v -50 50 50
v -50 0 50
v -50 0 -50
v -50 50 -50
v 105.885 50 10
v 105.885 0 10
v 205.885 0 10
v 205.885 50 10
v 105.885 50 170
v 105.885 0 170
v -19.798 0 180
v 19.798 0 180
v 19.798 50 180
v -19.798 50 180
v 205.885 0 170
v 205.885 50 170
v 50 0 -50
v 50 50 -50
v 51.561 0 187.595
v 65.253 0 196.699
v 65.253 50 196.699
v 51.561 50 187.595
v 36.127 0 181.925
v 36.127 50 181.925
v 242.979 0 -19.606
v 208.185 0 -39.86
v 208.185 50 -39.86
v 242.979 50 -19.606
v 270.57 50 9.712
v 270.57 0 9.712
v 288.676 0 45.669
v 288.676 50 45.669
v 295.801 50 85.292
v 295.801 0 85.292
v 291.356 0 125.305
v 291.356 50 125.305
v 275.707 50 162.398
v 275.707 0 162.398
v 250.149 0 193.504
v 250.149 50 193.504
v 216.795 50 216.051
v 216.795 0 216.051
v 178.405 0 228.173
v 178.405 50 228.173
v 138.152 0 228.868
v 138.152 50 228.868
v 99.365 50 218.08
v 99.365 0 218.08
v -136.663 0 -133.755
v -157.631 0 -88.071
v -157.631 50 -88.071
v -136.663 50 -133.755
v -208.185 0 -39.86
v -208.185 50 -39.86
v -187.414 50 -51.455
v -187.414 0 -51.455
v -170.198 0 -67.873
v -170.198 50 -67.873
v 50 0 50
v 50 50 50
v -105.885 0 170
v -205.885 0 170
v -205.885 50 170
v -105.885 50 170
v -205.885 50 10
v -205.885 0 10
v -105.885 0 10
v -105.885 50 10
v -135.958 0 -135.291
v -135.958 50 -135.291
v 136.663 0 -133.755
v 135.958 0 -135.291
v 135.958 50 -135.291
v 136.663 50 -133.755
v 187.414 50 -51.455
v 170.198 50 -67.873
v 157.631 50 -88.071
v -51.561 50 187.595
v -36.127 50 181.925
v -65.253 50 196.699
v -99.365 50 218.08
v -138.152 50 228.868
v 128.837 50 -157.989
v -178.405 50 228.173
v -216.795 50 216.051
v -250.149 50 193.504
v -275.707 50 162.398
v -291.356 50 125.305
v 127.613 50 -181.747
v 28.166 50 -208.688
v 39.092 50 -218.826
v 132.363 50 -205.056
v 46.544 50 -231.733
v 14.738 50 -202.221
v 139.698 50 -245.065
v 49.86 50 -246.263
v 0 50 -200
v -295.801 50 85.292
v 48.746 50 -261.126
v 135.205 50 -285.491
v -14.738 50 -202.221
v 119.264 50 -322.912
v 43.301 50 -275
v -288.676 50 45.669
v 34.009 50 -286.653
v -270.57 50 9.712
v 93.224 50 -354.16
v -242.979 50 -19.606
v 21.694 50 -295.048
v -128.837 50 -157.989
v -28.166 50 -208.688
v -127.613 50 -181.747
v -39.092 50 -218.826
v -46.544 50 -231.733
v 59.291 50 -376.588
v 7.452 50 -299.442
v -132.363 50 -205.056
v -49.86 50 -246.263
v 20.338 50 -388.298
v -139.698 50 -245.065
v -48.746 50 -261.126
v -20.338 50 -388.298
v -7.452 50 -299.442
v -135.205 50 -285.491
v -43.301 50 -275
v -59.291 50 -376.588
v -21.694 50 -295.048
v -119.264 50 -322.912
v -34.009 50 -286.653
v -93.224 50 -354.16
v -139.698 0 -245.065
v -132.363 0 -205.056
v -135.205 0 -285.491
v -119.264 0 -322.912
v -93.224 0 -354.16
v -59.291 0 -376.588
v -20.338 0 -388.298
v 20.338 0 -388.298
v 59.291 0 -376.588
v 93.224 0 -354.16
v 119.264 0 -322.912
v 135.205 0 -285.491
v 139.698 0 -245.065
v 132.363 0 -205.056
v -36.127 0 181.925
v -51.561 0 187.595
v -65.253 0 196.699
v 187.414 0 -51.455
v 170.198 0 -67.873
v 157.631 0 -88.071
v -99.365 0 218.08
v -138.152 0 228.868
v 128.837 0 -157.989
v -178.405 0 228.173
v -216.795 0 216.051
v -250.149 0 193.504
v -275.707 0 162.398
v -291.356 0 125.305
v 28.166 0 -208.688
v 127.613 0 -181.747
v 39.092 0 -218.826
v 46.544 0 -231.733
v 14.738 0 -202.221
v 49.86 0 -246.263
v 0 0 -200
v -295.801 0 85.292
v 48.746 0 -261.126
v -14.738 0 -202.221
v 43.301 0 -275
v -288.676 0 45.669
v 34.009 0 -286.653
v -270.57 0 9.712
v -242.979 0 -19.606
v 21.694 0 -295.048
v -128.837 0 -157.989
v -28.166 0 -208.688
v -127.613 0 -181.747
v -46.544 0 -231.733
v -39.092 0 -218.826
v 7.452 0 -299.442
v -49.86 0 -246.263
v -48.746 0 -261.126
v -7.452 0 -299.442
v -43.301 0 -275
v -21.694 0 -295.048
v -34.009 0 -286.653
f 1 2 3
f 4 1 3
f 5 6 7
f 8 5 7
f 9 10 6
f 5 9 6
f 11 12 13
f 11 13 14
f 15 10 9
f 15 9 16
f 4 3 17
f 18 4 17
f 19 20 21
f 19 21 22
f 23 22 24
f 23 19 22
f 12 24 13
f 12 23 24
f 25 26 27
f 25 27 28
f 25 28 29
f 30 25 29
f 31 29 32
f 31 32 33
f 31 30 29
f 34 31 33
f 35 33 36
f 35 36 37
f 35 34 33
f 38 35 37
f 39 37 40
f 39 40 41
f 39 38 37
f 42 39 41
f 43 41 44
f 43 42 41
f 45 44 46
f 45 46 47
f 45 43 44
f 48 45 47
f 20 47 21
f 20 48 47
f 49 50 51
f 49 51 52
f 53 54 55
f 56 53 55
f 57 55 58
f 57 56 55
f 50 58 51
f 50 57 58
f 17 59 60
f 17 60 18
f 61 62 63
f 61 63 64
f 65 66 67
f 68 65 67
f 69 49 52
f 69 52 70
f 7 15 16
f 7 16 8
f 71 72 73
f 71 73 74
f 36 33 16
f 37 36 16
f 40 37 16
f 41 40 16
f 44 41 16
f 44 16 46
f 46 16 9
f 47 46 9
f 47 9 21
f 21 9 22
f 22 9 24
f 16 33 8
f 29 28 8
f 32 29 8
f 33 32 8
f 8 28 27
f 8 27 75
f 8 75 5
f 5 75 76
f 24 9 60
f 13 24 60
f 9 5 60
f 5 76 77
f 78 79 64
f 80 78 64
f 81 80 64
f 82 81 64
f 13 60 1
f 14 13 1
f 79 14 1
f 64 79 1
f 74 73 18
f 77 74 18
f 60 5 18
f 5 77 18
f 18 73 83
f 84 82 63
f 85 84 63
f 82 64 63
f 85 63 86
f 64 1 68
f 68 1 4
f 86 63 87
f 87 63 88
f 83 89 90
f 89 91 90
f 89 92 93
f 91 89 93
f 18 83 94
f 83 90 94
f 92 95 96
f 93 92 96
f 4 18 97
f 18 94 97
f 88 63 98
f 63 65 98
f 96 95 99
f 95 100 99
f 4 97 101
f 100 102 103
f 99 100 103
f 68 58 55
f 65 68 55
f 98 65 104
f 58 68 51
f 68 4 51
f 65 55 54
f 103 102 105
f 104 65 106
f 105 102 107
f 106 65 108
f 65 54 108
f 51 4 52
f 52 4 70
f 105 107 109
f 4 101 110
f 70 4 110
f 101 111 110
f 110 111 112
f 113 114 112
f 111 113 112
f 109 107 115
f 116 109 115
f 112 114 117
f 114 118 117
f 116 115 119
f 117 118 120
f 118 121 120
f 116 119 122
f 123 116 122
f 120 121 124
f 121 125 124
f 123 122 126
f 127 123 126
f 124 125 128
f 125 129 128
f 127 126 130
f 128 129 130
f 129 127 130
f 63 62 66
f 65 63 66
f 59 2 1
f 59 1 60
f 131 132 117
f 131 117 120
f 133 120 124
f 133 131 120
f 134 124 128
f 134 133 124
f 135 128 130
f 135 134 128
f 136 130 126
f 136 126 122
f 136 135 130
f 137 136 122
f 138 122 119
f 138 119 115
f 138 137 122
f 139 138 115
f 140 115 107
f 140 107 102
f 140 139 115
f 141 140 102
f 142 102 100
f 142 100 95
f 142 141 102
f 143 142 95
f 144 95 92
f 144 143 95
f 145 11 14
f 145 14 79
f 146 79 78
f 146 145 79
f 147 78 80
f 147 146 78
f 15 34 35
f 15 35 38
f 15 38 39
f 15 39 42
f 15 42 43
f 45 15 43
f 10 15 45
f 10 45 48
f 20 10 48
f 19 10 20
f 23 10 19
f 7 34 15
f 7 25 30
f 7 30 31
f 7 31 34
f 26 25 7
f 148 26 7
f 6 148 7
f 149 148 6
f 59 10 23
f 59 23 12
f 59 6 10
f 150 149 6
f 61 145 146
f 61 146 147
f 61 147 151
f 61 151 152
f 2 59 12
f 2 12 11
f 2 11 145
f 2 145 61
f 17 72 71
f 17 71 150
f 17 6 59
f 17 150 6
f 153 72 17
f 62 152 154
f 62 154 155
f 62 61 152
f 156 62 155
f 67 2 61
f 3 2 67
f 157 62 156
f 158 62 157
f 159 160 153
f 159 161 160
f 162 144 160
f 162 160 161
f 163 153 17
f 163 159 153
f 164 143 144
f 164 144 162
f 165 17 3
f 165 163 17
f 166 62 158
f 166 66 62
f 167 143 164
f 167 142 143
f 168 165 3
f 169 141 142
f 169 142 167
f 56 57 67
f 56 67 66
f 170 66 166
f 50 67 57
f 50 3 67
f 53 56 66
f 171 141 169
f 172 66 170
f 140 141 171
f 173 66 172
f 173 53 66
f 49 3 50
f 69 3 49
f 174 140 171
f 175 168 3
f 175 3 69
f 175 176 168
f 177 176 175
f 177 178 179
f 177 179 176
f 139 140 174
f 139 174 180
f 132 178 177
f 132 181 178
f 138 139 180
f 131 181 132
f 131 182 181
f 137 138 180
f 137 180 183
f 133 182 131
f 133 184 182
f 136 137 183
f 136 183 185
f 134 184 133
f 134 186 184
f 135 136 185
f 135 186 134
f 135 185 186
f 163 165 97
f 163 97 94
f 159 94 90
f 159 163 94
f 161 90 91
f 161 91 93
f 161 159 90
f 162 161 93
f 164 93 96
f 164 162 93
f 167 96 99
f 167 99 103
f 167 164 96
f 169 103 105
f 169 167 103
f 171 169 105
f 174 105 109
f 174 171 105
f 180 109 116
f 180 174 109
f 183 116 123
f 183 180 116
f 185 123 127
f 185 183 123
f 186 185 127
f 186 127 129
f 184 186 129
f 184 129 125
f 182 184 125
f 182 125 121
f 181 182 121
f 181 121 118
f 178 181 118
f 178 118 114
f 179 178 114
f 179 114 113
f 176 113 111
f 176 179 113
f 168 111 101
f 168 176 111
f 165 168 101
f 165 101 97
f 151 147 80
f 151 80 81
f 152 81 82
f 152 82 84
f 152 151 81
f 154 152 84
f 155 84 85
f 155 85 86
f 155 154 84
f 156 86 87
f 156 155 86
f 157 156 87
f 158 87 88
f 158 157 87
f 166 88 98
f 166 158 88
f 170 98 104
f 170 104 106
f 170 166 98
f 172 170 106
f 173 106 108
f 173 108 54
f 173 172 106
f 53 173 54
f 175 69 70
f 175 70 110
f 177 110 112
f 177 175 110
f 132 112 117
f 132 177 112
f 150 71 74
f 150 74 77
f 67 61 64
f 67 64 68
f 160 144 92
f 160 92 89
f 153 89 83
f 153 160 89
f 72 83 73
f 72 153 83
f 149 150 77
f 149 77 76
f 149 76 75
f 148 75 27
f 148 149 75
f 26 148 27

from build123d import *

# Parameters (mm, degrees)
SKETCH1_R           = 50
SKETCH1_W           = 100
SKETCH1_H           = 100
SKETCH1_H_2         = 160
BOSS_EXTRUDE1_DEPTH = 50


with BuildPart() as part:
    # Sketch1 → Boss-Extrude1 (new body)
    with BuildSketch(Plane(origin=(0, 0, 0), x_dir=(1, 0, 0), z_dir=(0, 1, 0))):
        with BuildLine():
            Line((-157.631299989, 88.07121729), (-136.663415109, 133.755017511))
            Line((-136.663415109, 133.755017511), (-135.958224263, 135.291452776))
            ThreePointArc((-135.958224263, 135.291452776), (-127.47369707, 169.829345008), (-132.36344953, 205.056373302))
            ThreePointArc((-132.36344953, 205.056373302), (0, 389.785594222), (132.36344953, 205.056373302))
            ThreePointArc((132.36344953, 205.056373302), (127.47369707, 169.829345008), (135.958224263, 135.291452776))
            Line((135.958224263, 135.291452776), (136.663415109, 133.755017511))
            Line((136.663415109, 133.755017511), (157.631299989, 88.07121729))
            ThreePointArc((157.631299989, 88.07121729), (178.287067415, 59.119663384), (208.18524924, 39.859551103))
            ThreePointArc((208.18524924, 39.859551103), (275.706725604, -162.3983111), (65.252859665, -196.699373836))
            ThreePointArc((65.252859665, -196.699373836), (44.010636723, -184.306940013), (19.797939242, -180))
            Line((19.797939242, -180), (-19.797939242, -180))
            ThreePointArc((-19.797939242, -180), (-44.010636723, -184.306940013), (-65.252859665, -196.699373836))
            ThreePointArc((-65.252859665, -196.699373836), (-275.706725604, -162.3983111), (-208.18524924, 39.859551103))
            ThreePointArc((-208.18524924, 39.859551103), (-178.287067415, 59.119663384), (-157.631299989, 88.07121729))
        make_face()
        with Locations(Location((0, 250, 0), (0, 0, 270))):
            Circle(SKETCH1_R, mode=Mode.SUBTRACT)
        Rectangle(SKETCH1_W, SKETCH1_H, mode=Mode.SUBTRACT)
        with Locations((155.884572681, -90)):
            Rectangle(SKETCH1_W, SKETCH1_H_2, mode=Mode.SUBTRACT)
        with Locations((-155.884572681, -90)):
            Rectangle(SKETCH1_W, SKETCH1_H_2, mode=Mode.SUBTRACT)
    extrude(amount=BOSS_EXTRUDE1_DEPTH)


solid = part.part
